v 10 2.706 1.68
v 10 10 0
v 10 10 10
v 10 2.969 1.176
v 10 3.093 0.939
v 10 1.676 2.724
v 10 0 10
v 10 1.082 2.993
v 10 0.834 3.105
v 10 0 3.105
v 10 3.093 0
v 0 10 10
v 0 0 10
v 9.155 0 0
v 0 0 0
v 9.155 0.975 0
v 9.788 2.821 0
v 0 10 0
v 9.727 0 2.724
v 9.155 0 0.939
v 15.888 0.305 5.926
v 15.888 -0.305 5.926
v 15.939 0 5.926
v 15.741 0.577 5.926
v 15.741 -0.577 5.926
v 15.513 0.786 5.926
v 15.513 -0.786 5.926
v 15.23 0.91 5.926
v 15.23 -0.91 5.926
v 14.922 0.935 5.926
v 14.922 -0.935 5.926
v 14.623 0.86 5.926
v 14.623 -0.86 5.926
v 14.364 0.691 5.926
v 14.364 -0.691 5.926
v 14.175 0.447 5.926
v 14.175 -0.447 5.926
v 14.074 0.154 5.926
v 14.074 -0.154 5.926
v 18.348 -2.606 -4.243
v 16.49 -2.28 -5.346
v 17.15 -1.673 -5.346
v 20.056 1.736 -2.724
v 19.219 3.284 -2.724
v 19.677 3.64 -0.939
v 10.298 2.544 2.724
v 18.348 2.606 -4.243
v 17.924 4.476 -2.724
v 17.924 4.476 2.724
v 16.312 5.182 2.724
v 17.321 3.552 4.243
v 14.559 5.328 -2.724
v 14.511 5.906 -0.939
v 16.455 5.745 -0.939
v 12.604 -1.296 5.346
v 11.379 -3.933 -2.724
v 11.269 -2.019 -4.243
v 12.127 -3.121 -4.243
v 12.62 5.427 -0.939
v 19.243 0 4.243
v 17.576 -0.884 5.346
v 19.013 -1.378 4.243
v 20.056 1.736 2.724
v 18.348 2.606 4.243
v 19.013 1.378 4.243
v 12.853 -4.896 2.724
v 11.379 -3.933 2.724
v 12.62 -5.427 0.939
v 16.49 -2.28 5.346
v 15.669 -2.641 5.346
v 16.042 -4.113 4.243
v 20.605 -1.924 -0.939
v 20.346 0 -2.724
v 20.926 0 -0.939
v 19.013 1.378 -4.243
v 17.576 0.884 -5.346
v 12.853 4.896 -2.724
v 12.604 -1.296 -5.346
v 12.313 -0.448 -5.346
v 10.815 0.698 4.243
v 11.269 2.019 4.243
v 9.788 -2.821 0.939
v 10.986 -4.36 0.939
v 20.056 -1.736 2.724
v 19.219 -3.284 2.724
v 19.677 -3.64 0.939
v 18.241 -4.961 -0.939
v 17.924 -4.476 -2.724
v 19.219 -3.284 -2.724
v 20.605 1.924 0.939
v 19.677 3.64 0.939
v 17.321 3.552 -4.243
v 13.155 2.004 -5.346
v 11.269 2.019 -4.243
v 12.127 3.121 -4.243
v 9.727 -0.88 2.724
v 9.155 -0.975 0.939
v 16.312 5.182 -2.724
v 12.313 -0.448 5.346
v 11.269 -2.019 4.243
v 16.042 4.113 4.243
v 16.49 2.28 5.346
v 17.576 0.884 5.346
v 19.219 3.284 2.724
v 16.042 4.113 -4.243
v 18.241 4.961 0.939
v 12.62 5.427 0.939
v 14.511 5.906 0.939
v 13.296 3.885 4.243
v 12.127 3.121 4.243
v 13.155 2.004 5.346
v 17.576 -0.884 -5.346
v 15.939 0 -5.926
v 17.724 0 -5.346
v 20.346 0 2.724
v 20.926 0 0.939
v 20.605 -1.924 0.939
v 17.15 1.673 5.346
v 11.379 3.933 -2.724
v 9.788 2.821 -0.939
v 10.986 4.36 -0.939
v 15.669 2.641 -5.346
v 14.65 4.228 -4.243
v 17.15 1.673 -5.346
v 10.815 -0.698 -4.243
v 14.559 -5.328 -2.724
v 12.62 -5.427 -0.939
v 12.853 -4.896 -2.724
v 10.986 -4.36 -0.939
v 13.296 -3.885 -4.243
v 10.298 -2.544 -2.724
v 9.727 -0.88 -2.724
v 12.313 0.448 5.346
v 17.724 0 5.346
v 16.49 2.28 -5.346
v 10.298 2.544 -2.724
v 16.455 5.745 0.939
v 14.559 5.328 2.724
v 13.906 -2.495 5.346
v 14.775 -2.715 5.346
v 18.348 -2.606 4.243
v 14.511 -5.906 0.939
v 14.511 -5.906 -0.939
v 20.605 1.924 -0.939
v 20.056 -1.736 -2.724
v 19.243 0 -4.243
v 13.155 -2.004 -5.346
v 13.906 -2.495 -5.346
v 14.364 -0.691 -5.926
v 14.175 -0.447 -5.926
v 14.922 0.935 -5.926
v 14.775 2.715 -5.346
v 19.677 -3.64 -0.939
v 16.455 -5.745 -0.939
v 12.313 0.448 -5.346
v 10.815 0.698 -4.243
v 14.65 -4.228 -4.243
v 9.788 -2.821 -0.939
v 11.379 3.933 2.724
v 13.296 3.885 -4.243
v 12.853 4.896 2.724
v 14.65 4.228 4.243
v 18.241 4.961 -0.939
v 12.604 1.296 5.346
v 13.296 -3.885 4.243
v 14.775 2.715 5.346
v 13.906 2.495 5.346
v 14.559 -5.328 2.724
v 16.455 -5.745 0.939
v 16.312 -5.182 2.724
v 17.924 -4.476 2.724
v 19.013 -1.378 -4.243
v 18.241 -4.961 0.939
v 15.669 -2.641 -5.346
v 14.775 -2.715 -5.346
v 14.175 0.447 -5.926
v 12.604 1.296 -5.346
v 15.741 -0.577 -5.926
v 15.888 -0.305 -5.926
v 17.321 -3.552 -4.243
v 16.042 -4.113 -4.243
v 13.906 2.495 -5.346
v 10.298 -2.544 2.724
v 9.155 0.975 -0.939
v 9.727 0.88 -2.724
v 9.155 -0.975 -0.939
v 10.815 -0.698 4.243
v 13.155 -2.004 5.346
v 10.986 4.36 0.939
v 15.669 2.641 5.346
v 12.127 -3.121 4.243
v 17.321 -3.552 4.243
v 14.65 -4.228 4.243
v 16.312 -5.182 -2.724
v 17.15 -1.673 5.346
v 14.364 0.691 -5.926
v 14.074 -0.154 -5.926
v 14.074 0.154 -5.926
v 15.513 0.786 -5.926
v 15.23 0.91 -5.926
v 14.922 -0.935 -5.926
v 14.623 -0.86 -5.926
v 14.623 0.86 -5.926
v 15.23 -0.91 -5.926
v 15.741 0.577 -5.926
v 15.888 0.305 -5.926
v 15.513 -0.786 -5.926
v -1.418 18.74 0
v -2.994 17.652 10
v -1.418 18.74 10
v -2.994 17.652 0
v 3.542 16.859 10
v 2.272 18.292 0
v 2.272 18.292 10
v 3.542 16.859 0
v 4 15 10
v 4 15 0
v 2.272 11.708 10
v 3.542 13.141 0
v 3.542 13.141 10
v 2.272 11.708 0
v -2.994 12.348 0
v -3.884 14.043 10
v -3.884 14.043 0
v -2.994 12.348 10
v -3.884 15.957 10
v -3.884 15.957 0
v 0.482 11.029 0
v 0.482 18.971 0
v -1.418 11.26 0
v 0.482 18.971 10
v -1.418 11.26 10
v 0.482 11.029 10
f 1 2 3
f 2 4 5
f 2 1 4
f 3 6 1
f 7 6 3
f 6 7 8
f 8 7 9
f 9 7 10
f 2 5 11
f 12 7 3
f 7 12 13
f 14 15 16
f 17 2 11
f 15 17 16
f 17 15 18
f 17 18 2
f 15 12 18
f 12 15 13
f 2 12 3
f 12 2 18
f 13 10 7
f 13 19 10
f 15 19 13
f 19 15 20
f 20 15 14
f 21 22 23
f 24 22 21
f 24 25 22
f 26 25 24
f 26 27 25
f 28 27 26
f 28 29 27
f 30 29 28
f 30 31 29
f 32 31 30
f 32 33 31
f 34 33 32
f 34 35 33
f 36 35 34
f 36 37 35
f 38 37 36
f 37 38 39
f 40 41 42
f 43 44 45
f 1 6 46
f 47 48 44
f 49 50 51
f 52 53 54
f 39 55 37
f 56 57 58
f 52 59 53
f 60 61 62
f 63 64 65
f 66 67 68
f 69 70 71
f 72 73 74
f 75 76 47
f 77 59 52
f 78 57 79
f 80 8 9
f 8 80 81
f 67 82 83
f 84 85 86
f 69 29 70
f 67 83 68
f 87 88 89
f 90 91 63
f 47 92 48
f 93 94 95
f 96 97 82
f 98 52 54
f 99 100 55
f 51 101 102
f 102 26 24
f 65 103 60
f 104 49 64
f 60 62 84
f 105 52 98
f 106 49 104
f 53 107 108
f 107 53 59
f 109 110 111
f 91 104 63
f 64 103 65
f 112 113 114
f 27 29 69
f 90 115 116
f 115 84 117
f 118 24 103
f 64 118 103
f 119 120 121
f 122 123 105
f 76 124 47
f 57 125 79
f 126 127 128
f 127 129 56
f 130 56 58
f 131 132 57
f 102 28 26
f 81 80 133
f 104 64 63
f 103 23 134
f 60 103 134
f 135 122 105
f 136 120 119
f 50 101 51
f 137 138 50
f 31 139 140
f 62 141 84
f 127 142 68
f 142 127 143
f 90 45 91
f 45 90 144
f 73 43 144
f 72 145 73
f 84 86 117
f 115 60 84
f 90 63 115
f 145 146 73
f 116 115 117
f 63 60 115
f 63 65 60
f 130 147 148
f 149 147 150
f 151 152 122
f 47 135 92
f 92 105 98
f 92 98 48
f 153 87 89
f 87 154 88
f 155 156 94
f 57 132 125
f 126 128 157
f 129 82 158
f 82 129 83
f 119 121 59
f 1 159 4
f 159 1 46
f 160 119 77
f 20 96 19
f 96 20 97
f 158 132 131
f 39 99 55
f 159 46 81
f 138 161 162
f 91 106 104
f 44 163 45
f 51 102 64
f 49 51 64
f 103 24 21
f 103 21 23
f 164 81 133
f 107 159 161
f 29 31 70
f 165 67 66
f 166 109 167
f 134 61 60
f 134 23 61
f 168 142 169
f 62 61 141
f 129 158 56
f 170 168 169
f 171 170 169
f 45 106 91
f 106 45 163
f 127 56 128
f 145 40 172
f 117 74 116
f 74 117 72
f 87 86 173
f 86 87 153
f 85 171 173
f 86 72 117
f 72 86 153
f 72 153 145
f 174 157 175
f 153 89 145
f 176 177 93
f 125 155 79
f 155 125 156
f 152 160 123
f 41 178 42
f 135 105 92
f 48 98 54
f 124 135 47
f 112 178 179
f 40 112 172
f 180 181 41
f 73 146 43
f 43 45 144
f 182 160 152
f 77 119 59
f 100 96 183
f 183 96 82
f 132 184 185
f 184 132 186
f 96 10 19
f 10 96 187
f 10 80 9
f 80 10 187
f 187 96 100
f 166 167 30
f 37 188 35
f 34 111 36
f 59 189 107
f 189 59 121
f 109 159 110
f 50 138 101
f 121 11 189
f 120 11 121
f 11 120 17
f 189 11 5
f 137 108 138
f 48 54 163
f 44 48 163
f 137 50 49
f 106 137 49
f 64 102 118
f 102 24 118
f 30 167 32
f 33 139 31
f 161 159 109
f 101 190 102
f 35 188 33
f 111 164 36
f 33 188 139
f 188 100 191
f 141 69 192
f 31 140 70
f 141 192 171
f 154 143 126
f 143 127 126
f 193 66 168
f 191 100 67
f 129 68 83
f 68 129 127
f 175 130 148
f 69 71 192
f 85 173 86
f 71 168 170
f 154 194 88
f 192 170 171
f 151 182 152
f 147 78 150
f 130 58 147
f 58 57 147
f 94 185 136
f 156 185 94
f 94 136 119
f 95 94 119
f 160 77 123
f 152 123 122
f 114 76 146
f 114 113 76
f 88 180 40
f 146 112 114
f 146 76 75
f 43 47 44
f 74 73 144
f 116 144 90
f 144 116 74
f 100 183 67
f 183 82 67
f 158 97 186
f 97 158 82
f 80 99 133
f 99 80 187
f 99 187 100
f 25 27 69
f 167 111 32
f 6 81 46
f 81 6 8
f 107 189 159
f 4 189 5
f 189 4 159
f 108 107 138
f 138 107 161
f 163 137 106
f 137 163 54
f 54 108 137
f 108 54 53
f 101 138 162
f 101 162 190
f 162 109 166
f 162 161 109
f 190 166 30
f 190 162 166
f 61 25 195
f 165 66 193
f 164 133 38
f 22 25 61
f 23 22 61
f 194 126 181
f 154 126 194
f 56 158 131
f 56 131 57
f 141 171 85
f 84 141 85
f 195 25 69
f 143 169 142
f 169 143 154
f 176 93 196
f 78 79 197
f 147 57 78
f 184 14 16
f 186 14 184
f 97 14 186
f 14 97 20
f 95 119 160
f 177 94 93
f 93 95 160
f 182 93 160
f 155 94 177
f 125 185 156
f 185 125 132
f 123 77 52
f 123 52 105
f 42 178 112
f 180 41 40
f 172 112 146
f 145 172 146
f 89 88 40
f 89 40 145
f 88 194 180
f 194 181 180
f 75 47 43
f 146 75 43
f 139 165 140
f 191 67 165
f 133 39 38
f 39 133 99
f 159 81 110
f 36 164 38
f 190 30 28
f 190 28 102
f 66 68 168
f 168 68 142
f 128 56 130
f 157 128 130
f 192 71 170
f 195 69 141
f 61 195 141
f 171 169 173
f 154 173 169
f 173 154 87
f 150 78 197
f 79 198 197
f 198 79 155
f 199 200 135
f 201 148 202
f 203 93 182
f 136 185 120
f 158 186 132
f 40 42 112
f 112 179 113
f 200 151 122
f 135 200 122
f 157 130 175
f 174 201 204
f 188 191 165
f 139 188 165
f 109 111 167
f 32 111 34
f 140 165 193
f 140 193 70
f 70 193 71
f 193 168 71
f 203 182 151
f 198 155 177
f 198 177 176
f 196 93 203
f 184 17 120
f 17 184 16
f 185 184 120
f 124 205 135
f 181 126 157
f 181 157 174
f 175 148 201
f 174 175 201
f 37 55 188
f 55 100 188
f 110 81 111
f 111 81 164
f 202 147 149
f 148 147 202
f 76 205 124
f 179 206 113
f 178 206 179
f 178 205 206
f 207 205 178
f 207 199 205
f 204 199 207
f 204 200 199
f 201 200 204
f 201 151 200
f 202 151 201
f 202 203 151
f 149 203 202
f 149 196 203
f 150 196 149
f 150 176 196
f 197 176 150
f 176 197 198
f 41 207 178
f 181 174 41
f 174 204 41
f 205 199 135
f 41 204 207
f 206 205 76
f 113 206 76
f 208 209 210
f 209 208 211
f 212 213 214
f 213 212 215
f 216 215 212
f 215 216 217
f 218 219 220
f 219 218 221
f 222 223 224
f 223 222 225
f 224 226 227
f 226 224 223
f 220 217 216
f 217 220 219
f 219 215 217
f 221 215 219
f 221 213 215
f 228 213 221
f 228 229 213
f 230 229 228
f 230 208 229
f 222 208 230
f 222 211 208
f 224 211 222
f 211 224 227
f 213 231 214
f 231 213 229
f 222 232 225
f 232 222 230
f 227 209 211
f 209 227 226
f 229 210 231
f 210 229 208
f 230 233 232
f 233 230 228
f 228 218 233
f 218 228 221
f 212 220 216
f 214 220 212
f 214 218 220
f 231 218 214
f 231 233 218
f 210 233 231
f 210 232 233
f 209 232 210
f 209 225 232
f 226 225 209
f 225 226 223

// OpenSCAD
union() {
    color("red") translate([0, 0, 0]) cube([10, 10, 10]);
    color("blue") translate([15, 0, 0]) sphere(r = 6);
    color("green") translate([0, 15, 0]) cylinder(h = 10, r = 4);
}
